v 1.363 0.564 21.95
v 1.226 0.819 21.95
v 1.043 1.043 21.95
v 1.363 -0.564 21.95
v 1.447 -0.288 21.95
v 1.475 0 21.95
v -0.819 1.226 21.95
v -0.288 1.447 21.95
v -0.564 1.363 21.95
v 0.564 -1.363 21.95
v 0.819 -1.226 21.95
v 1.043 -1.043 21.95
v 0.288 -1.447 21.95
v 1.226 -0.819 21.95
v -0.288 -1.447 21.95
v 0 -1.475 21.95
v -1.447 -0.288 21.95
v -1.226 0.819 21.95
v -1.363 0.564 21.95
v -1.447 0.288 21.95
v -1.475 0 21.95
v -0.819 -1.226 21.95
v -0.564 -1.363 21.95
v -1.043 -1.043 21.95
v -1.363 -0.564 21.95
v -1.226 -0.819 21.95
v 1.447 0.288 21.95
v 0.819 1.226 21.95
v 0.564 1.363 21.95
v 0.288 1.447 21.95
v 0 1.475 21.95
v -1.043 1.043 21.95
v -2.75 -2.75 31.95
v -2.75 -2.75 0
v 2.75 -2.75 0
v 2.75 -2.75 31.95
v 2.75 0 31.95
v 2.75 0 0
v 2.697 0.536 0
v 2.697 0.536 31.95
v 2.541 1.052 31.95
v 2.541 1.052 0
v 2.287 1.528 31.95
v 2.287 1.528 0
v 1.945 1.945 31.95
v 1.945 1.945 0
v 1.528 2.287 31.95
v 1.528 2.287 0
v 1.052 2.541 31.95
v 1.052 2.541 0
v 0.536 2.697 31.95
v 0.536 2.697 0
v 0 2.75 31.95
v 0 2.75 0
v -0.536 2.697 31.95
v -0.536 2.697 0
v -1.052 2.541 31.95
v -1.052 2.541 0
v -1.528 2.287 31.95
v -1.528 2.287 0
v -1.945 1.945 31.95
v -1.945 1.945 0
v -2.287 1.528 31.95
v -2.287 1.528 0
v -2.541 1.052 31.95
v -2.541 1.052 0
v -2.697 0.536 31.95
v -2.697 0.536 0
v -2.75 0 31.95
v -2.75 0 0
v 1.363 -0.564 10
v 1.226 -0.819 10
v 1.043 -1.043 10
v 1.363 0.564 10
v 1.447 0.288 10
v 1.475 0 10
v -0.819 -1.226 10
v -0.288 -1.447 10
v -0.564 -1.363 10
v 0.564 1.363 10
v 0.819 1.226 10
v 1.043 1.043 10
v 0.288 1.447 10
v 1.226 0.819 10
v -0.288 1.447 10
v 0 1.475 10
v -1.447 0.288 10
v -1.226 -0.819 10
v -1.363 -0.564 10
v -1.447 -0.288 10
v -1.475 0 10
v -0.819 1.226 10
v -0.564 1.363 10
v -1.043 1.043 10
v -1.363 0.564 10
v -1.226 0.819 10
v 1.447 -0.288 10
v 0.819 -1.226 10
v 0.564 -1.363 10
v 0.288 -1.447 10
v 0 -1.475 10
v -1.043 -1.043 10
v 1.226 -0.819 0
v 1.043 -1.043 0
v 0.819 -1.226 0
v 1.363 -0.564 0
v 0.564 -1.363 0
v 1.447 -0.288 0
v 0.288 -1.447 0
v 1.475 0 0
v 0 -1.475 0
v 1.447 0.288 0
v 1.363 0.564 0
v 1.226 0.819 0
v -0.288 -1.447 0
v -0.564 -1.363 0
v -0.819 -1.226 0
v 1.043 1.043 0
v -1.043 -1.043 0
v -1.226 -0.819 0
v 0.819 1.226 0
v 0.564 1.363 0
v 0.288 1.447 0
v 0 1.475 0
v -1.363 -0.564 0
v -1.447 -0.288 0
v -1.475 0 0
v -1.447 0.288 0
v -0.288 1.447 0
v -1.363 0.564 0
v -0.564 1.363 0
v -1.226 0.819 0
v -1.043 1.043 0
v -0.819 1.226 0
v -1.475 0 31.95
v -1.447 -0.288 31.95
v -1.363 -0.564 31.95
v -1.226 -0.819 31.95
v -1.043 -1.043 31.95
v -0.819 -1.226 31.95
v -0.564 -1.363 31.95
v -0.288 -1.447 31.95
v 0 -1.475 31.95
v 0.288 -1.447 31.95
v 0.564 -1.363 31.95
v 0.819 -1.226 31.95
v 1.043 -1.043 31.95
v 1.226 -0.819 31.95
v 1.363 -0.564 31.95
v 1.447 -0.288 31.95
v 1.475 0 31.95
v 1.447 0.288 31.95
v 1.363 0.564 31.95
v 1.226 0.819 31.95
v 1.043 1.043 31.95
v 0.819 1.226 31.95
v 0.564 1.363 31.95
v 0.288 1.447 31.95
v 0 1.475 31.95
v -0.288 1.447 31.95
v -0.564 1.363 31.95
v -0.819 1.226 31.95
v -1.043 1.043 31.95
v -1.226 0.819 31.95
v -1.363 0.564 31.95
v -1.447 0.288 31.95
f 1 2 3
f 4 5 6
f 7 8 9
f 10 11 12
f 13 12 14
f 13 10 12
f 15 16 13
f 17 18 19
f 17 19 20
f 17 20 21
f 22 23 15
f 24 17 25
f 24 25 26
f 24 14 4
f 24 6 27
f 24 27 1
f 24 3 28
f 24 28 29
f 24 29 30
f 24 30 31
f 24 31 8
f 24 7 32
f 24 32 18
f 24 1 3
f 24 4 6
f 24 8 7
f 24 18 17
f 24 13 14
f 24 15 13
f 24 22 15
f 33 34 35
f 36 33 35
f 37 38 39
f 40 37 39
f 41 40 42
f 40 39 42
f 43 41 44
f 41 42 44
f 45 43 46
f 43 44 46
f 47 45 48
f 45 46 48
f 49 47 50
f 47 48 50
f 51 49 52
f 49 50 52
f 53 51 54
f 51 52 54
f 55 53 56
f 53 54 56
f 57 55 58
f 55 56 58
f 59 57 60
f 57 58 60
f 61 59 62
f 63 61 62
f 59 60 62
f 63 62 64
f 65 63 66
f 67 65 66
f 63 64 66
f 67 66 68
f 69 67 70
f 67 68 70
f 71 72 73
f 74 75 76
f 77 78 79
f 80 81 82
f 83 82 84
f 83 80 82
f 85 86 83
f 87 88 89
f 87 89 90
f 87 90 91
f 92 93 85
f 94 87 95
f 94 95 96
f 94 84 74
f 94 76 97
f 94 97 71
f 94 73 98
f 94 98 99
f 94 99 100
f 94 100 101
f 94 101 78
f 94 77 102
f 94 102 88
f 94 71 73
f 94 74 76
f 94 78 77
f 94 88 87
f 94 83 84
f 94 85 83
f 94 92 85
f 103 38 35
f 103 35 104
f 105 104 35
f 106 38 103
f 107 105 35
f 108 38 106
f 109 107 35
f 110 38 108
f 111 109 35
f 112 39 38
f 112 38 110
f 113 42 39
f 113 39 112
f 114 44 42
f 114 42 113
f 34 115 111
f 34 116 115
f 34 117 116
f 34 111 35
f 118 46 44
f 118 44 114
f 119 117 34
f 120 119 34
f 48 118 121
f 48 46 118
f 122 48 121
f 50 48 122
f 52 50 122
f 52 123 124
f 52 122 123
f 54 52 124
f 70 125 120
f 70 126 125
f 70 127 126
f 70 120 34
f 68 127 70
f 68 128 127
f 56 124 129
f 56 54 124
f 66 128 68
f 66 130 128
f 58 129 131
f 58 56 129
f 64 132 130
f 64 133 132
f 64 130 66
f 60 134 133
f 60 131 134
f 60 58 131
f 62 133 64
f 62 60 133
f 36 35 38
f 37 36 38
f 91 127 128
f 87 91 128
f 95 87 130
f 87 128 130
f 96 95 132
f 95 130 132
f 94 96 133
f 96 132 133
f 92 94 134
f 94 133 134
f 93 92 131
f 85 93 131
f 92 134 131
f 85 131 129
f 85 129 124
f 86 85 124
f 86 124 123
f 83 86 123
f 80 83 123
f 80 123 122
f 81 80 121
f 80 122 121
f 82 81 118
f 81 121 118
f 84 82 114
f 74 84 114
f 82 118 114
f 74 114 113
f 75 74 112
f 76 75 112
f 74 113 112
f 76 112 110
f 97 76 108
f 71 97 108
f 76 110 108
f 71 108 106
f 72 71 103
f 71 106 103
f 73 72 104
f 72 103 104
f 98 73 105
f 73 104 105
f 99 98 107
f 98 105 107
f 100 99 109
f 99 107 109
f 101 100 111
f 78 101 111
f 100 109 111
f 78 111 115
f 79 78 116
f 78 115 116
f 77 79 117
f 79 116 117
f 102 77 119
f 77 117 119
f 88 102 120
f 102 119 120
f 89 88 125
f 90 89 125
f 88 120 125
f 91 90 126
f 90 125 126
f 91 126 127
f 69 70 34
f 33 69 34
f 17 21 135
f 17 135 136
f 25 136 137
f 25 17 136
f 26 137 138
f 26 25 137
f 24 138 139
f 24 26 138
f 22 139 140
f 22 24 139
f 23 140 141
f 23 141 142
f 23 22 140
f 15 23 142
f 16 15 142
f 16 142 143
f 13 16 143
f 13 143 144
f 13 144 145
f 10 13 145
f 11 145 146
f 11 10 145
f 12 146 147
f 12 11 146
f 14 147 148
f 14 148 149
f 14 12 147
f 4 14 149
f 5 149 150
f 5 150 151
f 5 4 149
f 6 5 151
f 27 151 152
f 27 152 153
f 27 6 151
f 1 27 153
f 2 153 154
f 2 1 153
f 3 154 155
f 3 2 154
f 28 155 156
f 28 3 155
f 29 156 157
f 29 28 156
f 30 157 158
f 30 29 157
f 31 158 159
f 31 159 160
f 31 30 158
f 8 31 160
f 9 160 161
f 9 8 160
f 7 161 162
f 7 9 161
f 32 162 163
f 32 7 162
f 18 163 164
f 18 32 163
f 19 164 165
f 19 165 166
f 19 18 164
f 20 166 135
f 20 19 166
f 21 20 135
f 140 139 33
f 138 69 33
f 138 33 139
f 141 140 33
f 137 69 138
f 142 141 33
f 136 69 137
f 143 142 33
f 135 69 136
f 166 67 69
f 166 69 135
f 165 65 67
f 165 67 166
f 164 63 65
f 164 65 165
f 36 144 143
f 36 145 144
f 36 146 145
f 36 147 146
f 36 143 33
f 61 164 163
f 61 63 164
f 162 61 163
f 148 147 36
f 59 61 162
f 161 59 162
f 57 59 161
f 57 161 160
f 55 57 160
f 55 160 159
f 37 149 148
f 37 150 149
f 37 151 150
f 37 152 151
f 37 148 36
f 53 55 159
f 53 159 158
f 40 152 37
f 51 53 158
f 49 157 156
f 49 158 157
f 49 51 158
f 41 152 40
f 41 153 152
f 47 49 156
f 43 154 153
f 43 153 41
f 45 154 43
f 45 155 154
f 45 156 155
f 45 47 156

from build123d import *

# Parameters (mm, degrees)
SKETCH1_R           = 2.75
SKETCH1_R_2         = 1.475
BOSS_EXTRUDE1_DEPTH = 31.95
BOSS_EXTRUDE2_START = -31.95
BOSS_EXTRUDE2_DEPTH = 31.95
SKETCH3_R           = 1.475
BOSS_EXTRUDE3_DEPTH = 31.95
SKETCH4_R           = 1.475
CUT_EXTRUDE1_DEPTH  = 10
CUT_EXTRUDE2_START  = -10
SKETCH5_R           = 1.475
CUT_EXTRUDE2_DEPTH  = 10


with BuildPart() as part:
    # Sketch1 → Boss-Extrude1 (new body)
    with BuildSketch(Plane.XY):
        Circle(SKETCH1_R)
        Circle(SKETCH1_R_2, mode=Mode.SUBTRACT)
    extrude(amount=BOSS_EXTRUDE1_DEPTH)

    # Sketch2 → Boss-Extrude2 (add)
    with BuildSketch(Plane.XY.offset(31.95).offset(BOSS_EXTRUDE2_START)):
        with BuildLine():
            ThreePointArc((0, -2.75), (-1.944543648, -1.944543648), (-2.75, 0))
            Line((-2.75, 0), (-2.75, -2.75))
            Line((-2.75, -2.75), (0, -2.75))
        make_face()
        with BuildLine():
            Line((2.75, -2.75), (2.75, 0))
            ThreePointArc((2.75, 0), (1.944543648, -1.944543648), (0, -2.75))
            Line((0, -2.75), (2.75, -2.75))
        make_face()
    extrude(amount=BOSS_EXTRUDE2_DEPTH)

    # Sketch3 → Boss-Extrude3 (add)
    with BuildSketch(Plane(origin=(0, 0, 0), x_dir=(-1, 0, 0), z_dir=(0, 0, -1))):
        Circle(SKETCH3_R)
    extrude(amount=-BOSS_EXTRUDE3_DEPTH)

    # Sketch4 → Cut-Extrude1 (cut)
    with BuildSketch(Plane(origin=(0, 0, 0), x_dir=(-1, 0, 0), z_dir=(0, 0, -1))):
        Circle(SKETCH4_R)
    extrude(amount=-CUT_EXTRUDE1_DEPTH, mode=Mode.SUBTRACT)

    # Sketch5 → Cut-Extrude2 (cut)
    with BuildSketch(Plane.XY.offset(31.95).offset(CUT_EXTRUDE2_START)):
        with Locations(Location((0, 0, 0), (0, 0, 180))):
            Circle(SKETCH5_R)
    extrude(amount=CUT_EXTRUDE2_DEPTH, mode=Mode.SUBTRACT)


solid = part.part
